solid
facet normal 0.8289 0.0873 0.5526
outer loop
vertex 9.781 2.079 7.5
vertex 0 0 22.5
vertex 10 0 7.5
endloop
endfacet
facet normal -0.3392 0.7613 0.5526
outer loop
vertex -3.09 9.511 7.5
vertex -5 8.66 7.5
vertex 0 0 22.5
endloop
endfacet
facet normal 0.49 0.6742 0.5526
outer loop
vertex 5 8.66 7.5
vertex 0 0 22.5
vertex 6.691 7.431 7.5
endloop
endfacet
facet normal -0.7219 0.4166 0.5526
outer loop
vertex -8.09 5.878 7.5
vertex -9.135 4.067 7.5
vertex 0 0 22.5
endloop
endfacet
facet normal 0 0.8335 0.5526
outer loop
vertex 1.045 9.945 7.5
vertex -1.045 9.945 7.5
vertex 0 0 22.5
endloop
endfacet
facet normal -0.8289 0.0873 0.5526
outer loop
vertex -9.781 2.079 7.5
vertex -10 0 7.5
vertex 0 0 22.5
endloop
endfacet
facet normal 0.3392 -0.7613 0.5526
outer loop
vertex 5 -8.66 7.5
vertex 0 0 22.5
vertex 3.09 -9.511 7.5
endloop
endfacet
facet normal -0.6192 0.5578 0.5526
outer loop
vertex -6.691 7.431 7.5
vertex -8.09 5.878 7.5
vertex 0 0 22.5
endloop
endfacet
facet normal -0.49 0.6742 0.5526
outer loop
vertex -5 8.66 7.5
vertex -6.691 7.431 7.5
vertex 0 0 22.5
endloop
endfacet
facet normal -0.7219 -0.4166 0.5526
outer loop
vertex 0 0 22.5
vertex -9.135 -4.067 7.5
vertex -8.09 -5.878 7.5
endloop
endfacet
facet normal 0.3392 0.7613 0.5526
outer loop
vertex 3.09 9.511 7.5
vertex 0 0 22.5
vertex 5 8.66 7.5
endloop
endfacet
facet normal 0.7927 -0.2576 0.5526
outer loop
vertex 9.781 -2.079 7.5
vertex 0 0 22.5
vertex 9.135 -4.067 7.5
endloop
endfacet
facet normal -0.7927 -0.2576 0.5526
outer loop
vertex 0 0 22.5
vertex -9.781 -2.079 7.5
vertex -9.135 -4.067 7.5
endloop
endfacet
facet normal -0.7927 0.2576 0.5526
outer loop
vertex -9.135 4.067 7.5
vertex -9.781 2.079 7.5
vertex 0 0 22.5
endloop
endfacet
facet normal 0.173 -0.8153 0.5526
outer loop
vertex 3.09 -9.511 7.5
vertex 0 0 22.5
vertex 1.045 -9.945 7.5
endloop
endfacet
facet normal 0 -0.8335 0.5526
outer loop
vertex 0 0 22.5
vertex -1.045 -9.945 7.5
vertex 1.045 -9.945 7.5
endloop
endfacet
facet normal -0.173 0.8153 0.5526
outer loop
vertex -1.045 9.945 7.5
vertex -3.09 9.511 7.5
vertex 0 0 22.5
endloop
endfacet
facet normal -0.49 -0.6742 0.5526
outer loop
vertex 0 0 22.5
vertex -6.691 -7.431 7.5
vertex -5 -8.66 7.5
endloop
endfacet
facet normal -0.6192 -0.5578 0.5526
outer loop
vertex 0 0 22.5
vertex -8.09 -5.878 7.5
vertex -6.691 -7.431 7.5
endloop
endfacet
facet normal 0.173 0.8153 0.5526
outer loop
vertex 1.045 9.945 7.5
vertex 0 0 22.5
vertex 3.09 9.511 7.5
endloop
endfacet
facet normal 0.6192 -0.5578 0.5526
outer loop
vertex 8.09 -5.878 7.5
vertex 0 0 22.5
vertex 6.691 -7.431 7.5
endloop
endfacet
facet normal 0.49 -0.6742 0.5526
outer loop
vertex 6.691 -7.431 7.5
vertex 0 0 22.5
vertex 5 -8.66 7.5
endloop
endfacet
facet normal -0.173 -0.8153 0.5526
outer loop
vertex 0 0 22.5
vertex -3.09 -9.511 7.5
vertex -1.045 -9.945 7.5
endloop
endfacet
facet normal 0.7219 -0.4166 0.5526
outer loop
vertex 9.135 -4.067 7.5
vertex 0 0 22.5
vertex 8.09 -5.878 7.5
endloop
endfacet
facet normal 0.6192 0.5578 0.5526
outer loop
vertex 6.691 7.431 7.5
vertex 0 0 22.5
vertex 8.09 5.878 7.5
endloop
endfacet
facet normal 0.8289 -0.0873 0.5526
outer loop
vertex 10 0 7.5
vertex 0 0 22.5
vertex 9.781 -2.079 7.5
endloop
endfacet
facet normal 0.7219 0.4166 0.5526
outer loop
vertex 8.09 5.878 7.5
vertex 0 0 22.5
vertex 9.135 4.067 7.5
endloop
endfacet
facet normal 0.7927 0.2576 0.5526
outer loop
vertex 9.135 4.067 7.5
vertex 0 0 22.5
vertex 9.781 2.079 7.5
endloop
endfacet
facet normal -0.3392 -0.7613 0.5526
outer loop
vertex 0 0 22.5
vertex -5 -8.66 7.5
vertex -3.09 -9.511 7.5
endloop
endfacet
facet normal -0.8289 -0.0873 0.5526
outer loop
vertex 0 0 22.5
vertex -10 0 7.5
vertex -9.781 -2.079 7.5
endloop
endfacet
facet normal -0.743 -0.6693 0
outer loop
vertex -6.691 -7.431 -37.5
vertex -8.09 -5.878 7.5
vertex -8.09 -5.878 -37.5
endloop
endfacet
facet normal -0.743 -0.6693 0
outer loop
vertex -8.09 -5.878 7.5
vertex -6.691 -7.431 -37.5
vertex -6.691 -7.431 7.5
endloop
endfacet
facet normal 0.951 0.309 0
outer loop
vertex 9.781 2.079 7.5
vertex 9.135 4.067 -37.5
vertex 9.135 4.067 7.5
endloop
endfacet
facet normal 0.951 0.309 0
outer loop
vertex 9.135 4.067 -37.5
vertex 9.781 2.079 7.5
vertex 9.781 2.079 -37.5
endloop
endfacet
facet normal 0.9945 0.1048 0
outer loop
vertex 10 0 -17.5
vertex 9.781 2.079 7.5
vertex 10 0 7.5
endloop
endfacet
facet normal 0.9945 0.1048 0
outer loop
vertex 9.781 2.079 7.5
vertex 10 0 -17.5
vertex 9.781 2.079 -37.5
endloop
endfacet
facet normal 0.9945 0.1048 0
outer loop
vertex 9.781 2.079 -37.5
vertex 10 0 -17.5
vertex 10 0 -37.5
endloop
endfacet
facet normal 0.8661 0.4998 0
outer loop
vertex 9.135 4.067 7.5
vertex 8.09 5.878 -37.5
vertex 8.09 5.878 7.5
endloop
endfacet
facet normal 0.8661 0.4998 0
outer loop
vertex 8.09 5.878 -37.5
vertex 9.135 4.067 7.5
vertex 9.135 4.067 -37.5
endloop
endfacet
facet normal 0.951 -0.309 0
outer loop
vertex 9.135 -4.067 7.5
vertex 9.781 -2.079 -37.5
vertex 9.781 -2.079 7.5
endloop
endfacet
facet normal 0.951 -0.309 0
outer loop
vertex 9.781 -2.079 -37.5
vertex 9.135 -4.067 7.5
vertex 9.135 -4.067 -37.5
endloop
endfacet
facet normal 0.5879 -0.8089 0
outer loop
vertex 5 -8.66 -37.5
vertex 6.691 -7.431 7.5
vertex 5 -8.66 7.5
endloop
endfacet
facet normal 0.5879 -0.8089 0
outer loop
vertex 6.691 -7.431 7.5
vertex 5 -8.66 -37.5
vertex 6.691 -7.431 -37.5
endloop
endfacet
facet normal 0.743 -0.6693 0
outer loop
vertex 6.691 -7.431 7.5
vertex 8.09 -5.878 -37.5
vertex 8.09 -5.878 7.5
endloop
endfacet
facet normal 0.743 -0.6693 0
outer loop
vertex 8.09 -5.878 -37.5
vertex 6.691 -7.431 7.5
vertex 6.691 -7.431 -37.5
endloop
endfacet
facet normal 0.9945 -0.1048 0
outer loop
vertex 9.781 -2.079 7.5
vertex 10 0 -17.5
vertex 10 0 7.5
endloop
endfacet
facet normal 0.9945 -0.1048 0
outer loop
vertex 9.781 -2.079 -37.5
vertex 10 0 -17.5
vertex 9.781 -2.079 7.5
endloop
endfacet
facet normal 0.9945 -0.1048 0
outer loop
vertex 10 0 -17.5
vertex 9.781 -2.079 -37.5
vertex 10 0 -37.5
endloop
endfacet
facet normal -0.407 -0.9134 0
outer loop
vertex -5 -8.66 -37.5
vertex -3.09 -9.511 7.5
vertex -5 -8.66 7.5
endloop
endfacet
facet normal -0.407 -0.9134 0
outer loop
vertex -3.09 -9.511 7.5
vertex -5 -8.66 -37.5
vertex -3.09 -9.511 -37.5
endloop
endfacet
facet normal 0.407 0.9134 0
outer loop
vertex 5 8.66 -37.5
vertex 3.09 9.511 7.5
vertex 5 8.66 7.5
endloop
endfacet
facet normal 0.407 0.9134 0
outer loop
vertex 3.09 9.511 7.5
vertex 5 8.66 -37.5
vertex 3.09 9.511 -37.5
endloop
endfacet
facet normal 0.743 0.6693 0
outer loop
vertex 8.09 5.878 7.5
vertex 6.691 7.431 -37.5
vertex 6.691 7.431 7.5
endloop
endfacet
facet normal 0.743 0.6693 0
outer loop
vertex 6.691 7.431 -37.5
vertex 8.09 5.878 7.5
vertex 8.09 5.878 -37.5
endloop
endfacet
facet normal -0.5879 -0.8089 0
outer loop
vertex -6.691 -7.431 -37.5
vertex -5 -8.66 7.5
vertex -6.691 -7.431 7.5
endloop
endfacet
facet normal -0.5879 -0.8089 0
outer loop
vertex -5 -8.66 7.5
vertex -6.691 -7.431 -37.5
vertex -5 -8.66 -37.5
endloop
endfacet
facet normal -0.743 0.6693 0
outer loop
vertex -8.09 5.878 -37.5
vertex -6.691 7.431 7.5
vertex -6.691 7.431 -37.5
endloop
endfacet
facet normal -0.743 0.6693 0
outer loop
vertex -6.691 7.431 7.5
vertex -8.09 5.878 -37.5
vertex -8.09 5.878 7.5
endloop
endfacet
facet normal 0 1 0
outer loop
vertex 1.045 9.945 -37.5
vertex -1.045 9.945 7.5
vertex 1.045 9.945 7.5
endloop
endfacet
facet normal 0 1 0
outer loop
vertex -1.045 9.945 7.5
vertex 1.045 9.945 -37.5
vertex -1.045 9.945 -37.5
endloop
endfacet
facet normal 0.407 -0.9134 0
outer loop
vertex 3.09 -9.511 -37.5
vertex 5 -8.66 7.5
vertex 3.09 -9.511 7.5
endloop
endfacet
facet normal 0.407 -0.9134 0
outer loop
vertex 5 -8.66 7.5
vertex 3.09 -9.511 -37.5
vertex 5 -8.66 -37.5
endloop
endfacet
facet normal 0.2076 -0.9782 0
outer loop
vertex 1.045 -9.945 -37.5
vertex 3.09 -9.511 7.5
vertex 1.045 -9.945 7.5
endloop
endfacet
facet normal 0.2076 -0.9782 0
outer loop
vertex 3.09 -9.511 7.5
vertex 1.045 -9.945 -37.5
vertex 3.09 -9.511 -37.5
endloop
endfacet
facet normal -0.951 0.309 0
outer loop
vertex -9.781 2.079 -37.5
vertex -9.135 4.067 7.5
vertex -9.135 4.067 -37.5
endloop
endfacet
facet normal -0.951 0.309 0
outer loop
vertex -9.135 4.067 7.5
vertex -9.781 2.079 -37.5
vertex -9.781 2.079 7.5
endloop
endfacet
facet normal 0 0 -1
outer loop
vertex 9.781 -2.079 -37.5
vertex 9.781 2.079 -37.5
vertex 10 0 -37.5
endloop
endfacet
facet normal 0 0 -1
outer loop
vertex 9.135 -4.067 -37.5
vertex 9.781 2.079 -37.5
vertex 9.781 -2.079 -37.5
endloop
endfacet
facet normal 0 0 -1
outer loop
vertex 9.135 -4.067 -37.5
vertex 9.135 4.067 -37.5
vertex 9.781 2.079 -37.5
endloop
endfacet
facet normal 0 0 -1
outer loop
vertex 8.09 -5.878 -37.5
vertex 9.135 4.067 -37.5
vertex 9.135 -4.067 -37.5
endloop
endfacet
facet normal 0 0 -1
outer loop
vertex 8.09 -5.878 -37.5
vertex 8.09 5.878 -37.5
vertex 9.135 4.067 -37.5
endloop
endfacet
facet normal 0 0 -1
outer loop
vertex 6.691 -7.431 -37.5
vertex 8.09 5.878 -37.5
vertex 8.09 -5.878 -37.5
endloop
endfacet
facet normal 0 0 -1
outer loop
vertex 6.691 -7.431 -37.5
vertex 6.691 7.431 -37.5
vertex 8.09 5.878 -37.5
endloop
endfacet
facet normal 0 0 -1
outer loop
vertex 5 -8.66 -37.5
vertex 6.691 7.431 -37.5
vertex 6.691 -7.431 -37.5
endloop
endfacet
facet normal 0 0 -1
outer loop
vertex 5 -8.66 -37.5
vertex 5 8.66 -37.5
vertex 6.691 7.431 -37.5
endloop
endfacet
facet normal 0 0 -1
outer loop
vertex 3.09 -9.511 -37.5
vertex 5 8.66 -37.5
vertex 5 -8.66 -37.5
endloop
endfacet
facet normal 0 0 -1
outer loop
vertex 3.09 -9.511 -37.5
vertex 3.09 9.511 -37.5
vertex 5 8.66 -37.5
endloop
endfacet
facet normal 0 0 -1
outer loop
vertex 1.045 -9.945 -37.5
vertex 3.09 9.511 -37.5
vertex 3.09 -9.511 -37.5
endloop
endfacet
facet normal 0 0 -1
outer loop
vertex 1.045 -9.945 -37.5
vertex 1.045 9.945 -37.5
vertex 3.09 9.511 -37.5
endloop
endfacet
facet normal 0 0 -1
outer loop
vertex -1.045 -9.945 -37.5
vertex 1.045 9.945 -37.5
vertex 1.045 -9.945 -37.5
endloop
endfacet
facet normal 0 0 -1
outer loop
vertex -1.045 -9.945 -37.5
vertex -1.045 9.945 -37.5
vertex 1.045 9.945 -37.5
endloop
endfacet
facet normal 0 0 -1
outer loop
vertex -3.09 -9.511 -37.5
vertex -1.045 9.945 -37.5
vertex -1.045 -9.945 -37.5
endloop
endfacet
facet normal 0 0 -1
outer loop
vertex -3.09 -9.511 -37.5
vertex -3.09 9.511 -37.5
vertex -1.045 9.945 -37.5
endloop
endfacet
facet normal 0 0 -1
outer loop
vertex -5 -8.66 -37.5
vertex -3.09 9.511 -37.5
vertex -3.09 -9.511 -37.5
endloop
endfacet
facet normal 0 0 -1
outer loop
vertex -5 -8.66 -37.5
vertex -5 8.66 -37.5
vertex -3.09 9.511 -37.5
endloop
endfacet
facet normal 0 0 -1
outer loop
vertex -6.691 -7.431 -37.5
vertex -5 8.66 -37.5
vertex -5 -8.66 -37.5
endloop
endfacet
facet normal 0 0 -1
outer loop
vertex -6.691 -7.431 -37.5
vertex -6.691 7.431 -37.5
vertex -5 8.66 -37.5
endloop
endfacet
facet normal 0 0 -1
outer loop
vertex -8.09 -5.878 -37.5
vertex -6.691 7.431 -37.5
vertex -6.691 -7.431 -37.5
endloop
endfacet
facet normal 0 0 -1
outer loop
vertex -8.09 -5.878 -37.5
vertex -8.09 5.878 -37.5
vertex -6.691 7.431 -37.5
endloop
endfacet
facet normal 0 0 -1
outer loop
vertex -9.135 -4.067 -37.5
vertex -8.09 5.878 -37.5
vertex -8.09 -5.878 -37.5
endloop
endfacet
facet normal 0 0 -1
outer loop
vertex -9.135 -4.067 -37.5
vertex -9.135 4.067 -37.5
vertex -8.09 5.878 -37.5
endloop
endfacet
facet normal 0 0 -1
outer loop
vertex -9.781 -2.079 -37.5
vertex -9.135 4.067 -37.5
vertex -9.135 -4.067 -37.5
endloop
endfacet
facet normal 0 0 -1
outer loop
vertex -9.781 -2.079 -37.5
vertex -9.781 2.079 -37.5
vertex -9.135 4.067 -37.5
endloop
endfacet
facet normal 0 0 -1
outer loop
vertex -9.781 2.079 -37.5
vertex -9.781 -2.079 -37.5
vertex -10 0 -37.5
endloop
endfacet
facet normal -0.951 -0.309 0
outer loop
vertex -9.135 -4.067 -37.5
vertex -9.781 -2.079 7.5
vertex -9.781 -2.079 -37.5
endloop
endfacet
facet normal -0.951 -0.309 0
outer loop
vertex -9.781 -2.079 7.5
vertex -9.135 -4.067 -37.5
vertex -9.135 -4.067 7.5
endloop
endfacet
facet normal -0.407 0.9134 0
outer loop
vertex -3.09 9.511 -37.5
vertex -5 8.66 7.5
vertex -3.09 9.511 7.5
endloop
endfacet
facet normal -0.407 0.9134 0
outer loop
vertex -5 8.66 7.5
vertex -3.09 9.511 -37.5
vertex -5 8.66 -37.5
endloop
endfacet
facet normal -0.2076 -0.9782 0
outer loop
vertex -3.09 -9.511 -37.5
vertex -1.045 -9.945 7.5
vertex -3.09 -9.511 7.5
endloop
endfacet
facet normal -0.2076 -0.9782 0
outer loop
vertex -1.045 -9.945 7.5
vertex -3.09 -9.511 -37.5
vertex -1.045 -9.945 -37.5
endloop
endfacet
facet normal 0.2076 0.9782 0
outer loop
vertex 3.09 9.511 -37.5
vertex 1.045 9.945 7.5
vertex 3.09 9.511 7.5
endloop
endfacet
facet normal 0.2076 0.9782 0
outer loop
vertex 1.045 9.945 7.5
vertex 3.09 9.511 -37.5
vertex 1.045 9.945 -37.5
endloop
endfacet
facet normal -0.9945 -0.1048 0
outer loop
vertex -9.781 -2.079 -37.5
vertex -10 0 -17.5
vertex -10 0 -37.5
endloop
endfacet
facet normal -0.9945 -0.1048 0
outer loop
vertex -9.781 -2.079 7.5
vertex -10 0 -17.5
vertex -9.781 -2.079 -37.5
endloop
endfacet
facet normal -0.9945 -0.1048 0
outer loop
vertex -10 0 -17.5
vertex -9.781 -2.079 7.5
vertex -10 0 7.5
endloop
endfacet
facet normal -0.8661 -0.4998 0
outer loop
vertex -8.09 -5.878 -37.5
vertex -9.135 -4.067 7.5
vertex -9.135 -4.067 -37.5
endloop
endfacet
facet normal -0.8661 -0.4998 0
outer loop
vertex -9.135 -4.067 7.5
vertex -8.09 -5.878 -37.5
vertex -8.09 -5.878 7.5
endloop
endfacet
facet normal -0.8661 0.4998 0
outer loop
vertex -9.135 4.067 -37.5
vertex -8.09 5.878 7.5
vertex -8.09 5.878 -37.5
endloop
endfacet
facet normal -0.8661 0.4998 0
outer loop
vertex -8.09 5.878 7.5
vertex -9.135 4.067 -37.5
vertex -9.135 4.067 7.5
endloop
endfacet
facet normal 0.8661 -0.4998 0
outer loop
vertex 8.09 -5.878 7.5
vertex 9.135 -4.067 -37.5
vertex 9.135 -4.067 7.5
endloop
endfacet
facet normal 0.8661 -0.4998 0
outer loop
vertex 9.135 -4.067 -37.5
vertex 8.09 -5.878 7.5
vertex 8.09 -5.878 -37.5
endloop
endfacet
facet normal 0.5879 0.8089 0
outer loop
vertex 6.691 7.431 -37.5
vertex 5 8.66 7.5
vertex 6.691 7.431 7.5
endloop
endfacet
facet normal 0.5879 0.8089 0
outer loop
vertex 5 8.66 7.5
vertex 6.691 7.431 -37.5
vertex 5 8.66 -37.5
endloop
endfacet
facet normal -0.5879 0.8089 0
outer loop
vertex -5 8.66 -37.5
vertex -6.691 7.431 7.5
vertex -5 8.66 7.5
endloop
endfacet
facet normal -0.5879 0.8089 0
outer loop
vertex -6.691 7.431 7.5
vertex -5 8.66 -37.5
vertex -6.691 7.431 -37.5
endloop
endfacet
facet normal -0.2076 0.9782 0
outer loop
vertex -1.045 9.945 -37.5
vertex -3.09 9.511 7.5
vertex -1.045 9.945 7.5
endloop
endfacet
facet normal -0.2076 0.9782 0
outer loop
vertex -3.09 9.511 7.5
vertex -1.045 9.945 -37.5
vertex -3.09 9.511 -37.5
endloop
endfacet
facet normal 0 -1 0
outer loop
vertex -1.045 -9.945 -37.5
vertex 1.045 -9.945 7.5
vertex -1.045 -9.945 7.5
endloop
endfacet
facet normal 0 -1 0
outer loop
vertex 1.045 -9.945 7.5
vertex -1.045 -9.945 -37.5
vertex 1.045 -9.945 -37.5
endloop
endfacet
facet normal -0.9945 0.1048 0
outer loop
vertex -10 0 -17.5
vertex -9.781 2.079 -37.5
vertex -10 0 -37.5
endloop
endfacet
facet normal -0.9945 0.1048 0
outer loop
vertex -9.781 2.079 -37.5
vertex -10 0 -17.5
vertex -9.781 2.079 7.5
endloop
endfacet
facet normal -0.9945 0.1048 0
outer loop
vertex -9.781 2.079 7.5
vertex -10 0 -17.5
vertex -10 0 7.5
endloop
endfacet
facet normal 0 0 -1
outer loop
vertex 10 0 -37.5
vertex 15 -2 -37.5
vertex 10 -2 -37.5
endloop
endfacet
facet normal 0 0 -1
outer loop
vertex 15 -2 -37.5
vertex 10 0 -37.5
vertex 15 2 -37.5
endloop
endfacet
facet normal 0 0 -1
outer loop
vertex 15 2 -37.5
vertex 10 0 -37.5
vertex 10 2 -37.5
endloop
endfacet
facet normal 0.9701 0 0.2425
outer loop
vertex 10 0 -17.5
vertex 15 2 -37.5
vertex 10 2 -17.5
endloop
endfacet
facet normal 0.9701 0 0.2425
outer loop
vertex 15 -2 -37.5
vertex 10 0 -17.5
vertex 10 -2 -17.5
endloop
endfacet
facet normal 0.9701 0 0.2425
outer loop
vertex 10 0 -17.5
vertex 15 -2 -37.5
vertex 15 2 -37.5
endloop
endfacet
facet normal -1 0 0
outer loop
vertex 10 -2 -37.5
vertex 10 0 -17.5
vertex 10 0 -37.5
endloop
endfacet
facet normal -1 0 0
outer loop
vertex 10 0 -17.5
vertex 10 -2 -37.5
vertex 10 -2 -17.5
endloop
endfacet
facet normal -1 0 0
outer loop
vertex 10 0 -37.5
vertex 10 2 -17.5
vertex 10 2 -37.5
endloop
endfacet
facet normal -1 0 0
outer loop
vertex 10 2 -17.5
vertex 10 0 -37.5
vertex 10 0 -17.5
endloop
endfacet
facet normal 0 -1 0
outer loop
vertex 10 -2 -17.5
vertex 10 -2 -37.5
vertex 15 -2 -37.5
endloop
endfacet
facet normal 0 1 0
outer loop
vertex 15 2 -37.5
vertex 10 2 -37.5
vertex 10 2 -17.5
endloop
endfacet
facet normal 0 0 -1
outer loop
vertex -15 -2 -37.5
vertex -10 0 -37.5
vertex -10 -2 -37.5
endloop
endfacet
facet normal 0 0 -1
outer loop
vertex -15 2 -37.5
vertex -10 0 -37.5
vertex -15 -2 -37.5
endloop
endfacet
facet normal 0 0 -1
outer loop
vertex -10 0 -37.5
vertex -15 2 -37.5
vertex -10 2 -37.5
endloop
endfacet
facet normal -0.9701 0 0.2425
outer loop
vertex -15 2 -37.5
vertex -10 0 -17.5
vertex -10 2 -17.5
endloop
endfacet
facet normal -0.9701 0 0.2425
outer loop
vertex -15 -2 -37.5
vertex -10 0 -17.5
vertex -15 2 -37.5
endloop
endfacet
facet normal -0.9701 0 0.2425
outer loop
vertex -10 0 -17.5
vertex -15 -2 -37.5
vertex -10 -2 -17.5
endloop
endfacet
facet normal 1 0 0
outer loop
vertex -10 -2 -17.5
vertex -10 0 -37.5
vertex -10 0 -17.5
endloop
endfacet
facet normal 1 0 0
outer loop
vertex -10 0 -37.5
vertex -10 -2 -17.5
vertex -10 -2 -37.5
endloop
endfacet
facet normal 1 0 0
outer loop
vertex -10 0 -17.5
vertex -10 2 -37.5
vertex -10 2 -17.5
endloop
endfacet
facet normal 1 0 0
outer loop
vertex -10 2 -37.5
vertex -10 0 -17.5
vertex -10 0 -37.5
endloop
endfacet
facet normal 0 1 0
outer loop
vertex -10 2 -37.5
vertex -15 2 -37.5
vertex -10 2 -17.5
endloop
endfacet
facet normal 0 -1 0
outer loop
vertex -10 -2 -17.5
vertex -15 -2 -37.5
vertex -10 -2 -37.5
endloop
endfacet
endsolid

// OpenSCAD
translate([0,0,15])
cylinder(h=15, r1=10, r2=0, center=true);
///base///
translate([0,0,-15])
cylinder(h=45, r=10, center=true);
///side one///
translate([0,0,-37.5])
polyhedron(
points=[ [10,-2,0], [10,2,0], [15,-2,0], [15,2,0], [10,-2,20], [10,2,20] ],
faces=[ [0,1,3,2], [5,4,2,3], [0,4,5,1], [0,2,4], [5,3,1] ]
);
///side two///
translate([0,0,-37.5])
polyhedron(
points=[ [-10,2,0], [-10,-2,0], [-15,2,0], [-15,-2,0], [-10,2,20], [-10,-2,20] ],
faces=[ [0,1,3,2], [5,4,2,3], [0,4,5,1], [0,2,4], [5,3,1] ]
);
